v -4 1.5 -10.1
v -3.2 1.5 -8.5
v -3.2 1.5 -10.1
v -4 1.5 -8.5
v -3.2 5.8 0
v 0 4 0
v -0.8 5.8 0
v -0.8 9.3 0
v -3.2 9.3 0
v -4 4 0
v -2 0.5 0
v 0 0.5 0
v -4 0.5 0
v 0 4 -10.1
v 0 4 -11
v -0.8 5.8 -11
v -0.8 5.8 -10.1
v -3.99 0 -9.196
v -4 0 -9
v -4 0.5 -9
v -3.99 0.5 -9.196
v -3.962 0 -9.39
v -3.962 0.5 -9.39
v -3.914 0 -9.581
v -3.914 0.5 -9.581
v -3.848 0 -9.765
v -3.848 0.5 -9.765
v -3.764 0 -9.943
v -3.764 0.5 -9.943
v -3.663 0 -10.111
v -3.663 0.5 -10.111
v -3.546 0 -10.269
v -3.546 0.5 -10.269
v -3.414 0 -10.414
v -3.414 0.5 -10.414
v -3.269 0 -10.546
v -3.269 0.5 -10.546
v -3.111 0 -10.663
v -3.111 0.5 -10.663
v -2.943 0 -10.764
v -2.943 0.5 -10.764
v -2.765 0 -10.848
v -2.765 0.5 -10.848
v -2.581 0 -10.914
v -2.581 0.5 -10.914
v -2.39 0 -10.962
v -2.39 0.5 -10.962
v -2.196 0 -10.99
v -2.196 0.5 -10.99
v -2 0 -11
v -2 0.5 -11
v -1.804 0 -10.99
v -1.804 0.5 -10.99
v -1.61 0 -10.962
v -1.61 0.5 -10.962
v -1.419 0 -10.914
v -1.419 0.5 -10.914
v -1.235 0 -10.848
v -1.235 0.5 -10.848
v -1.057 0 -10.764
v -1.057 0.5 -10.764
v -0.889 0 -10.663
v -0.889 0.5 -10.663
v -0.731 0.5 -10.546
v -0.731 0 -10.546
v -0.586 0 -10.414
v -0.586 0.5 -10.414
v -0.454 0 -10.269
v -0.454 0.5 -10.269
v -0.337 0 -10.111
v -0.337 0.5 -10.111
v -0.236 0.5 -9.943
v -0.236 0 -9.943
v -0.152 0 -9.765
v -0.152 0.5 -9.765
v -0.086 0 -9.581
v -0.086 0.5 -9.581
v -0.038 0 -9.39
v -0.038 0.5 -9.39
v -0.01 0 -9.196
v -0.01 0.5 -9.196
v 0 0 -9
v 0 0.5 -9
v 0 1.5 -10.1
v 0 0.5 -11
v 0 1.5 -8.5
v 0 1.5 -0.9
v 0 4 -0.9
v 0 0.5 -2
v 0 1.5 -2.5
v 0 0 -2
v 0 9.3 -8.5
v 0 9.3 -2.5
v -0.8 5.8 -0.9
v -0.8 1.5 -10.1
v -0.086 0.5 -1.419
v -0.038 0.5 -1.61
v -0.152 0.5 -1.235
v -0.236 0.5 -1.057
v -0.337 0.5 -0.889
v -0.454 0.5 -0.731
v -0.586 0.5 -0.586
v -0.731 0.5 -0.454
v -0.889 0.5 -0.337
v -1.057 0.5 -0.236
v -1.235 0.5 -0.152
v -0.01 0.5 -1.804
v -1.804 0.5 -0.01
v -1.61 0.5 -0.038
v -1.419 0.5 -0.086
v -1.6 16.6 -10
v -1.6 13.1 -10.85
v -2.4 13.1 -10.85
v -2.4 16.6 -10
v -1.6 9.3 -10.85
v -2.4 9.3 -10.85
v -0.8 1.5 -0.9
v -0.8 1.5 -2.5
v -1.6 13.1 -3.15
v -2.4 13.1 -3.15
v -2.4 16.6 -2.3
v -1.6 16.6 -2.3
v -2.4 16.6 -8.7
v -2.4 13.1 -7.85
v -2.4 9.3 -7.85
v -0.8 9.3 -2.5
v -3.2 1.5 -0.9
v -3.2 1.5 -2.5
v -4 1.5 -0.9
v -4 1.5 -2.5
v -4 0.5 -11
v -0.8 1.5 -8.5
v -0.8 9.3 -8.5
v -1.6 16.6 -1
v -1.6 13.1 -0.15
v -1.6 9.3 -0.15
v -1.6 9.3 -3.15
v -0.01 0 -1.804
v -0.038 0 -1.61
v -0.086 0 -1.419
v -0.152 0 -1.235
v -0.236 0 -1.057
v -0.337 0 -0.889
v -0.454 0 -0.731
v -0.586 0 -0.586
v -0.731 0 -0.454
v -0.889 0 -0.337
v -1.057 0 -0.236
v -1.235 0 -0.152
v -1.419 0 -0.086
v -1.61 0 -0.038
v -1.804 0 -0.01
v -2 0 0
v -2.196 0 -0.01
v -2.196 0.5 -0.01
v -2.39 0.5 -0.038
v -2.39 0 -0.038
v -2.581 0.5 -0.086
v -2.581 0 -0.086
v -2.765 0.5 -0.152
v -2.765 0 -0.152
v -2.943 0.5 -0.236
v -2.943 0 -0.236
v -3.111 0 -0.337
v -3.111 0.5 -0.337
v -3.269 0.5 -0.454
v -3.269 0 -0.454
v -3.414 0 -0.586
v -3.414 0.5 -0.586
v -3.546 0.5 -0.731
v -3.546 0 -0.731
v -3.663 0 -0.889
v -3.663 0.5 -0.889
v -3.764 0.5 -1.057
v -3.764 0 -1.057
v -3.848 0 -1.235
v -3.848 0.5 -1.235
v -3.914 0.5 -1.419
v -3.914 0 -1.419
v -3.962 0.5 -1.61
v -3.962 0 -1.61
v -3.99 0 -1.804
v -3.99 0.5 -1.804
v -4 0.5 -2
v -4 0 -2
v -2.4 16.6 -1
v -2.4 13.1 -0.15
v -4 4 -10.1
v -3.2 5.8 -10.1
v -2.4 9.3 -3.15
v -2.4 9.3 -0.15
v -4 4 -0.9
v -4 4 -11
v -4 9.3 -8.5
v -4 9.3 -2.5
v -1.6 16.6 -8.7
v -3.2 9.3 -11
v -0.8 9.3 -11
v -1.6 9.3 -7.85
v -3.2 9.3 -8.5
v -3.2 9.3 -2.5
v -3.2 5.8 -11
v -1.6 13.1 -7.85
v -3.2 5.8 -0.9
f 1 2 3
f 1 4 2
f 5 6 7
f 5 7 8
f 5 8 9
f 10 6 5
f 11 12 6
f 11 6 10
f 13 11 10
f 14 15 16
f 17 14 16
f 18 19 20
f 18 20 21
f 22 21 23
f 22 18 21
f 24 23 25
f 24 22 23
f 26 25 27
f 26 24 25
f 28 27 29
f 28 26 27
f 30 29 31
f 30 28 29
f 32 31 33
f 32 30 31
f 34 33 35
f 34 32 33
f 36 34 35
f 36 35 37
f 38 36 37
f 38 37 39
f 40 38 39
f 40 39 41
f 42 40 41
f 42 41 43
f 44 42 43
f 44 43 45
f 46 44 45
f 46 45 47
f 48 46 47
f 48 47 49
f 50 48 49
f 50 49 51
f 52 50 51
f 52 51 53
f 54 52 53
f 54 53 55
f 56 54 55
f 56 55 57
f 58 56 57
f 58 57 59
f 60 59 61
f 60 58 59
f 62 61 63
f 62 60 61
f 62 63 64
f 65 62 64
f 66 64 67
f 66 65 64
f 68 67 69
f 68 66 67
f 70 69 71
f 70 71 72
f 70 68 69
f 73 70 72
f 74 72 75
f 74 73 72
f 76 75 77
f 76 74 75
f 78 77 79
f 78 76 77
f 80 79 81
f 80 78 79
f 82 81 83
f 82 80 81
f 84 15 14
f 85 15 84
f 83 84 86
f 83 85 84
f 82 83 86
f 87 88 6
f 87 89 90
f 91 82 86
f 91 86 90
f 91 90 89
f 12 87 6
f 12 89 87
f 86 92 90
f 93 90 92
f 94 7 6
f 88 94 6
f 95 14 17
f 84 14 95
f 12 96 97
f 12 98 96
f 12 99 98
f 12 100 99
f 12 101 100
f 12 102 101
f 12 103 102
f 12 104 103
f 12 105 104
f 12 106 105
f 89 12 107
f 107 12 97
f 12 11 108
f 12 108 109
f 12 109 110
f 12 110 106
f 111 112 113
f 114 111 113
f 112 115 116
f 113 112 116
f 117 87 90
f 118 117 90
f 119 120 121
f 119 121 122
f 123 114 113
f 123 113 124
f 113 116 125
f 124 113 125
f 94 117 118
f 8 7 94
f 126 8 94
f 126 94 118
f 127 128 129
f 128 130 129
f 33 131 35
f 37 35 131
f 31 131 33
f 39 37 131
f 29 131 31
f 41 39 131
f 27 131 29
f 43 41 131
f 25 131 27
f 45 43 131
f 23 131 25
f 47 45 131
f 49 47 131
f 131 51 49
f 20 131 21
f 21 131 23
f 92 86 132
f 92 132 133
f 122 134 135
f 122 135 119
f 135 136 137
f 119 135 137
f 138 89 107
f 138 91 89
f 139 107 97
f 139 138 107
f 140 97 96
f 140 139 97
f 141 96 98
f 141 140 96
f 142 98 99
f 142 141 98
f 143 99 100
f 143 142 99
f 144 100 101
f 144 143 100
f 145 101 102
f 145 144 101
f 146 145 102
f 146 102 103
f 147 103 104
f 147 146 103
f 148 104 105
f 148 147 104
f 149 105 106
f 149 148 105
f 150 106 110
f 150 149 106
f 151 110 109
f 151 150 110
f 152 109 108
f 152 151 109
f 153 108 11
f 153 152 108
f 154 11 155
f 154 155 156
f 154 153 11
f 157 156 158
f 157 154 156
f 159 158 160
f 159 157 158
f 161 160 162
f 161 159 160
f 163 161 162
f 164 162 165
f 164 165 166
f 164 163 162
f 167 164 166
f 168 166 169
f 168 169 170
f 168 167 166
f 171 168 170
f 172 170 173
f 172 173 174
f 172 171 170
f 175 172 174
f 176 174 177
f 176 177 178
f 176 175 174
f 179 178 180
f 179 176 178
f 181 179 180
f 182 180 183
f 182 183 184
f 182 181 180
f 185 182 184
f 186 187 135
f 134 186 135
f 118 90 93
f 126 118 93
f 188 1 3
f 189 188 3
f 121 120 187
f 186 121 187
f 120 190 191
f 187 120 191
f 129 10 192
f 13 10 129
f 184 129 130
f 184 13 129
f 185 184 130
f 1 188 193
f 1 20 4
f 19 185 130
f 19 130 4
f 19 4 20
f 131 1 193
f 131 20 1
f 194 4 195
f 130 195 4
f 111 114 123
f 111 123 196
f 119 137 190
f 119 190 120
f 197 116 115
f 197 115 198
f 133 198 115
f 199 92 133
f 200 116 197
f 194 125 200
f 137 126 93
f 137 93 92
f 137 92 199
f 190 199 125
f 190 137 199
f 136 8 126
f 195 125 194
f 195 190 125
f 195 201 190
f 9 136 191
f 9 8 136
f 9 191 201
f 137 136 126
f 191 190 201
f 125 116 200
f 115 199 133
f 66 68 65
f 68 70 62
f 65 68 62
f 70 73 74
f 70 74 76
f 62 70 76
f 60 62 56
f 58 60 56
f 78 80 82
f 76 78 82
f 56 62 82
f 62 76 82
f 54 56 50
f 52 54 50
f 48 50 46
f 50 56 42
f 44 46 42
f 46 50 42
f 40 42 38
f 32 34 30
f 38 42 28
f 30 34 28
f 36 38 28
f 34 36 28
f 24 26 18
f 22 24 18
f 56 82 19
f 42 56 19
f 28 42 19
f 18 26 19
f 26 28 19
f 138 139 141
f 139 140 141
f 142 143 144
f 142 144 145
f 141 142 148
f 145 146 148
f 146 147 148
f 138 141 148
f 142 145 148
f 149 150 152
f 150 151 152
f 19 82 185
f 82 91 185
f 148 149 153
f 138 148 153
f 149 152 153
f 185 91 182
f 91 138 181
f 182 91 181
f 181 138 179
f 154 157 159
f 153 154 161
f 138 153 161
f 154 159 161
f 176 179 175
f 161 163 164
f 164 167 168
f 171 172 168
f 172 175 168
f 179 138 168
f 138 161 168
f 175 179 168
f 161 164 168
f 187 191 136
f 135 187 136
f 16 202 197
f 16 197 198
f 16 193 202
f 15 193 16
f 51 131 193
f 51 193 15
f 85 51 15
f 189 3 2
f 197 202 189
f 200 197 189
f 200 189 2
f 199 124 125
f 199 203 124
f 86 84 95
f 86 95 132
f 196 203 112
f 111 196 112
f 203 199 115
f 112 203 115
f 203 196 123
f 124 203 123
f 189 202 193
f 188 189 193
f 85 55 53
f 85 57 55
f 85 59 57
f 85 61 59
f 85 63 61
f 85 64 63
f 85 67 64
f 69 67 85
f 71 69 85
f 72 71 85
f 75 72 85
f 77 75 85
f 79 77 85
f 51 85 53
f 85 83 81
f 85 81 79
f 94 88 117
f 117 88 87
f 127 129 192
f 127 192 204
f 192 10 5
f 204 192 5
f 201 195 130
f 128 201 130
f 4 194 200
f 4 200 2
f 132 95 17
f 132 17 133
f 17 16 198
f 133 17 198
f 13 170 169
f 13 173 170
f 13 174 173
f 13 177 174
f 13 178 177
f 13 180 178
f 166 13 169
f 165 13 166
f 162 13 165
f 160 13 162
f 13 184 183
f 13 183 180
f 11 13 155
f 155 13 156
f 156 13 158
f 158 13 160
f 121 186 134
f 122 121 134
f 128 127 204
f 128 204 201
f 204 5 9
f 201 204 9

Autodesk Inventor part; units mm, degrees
ref_plane "YZ Plane" through (0, 0, 0) normal (1, 0, 0) x (0, 1, 0)
sketch "Sketch1" plane through (0, 0, 0) normal (0, 1, 0) x (-1, 0, 0)
  line L0 (0, 0) -> (4, 0)
  line L1 (4, 0) -> (4, -11)
  line L2 (4, -11) -> (0, -11)
  line L3 (0, -11) -> (0, 0)
  dimension "d0" = 4
  dimension "d1" = 11
extrude "Extrusion1" add sketch "Sketch1" along normal blind 9.3
sketch "Sketch2" plane through (0, 9.3, 0) normal (0, 1, 0) x (1, 0, 0)
  line L0 (-4, 0) -> (0, 0) projected
  line L1 (0, 0) -> (0, 11) projected
  line L2 (0, 11) -> (-4, 11) construction
  line L3 (-4, 11) -> (-4, 0) projected
  line L4 (0, 11) -> (-4, 11) construction
  line L5 (-2.4, 0.15) -> (-1.6, 0.15)
  line L6 (-1.6, 0.15) -> (-1.6, 10.85)
  line L7 (-1.6, 10.85) -> (-2.4, 10.85)
  line L8 (-2.4, 10.85) -> (-2.4, 0.15)
  dimension "d5" = 0.8
  dimension "d6" = 4
  dimension "d7" = 1.6
  dimension "d40" = 0.15
  dimension "d41" = 0.15
extrude "Extrusion2" add sketch "Sketch2" along normal blind 7.3
sketch "Sketch3" plane through (-1.6, 9.3, -0.15) normal (1, 0, 0) x (0, 0, -1)
  line L0 (10.7, 0) -> (0, 0) projected
  line L1 (10.7, 0) -> (10.7, 7.3) projected
  line L2 (0, 7.3) -> (10.7, 7.3) projected
  line L3 (0, 0) -> (0, 7.3) projected
  line L4 (0, 7.3) -> (10.7, 7.3) projected
  line L5 (0, 0) -> (10.7, 0) projected
  line L6 (3, 7.3) -> (7.7, 7.3)
  line L7 (7.7, 7.3) -> (7.7, 0)
  line L8 (7.7, 0) -> (3, 0)
  line L9 (3, 0) -> (3, 7.3)
  point P0 (-0.15, -9.3)
  dimension "d10" = 3
  dimension "d11" = 3
extrude "Extrusion3" cut sketch "Sketch3" against normal blind 9.3 contours L0 L9 L2 L7
chamfer "Chamfer1" distance 0.85 distance2 3.5 1 edges at (-2, 16.6, -3.15) measured on face at (-2.1333, 16.6, -2.15)
chamfer "Chamfer2" distance 0.85 distance2 3.5 1 edges at (-2, 16.6, -0.15) measured on face at (-2.1333, 16.6, -1.5833)
chamfer "Chamfer3" distance 0.85 distance2 3.5 1 edges at (-2, 16.6, -7.85) measured on face at (-2.1333, 16.6, -9.85)
chamfer "Chamfer4" distance 0.85 distance2 3.5 1 edges at (-2, 16.6, -10.85) measured on face at (-2.1333, 16.6, -10.1333)
sketch "Sketch4" plane through (0, 0, 0) normal (0, -1, 0) x (1, 0, 0)
  line L0 (0, 0) -> (-4, 0) projected
  line L1 (-4, 0) -> (-4, -11) projected
  line L2 (-4, -11) -> (0, -11) projected
  line L3 (0, -11) -> (0, 0) projected
  line L4 (-2, -2) -> (-2, -9) construction
  line L5 (-4, -2) -> (-4, -9)
  line L6 (0, -9) -> (0, -2)
  arc A0 (0, -2) -> (-4, -2) centre (-2, -2) ccw
  arc A1 (-4, -9) -> (0, -9) centre (-2, -9) ccw
  line L7 (0, 0) -> (-4, 0) projected
  line L8 (0, -11) -> (0, 0) projected
  point P0 (-2, -5.5)
extrude "Extrusion4" cut sketch "Sketch4" against normal blind 0.5 contours L3 A0 L0 | A0 L1 L0 | L3 L2 A1 | A1 L2 L1
sketch "Sketch5" plane through (-4, 9.3, -11) normal (-1, 0, 0) x (0, 0, 1)
  line L0 (0, -8.8) -> (2, -8.8) projected
  line L1 (2, -8.8) -> (2, -9.3) projected
  line L2 (9, -9.3) -> (2, -9.3) construction
  line L3 (9, -8.8) -> (9, -9.3) projected
  line L4 (9, -8.8) -> (11, -8.8) projected
  line L5 (11, -8.8) -> (11, 0) projected
  line L6 (0, 0) -> (11, 0) projected
  line L7 (0, -8.8) -> (0, 0) projected
  line L8 (10.1, 0) -> (8.5, 0)
  line L9 (8.5, 0) -> (8.5, -7.8)
  line L10 (8.5, -7.8) -> (10.1, -7.8)
  line L11 (10.1, -7.8) -> (10.1, 0)
  line L12 (11, 0) -> (0, 0) projected
  line L13 (0.9, 0) -> (2.5, 0)
  line L14 (2.5, 0) -> (2.5, -7.8)
  line L15 (2.5, -7.8) -> (0.9, -7.8)
  line L16 (0.9, -7.8) -> (0.9, 0)
  point P0 (11, -9.3)
  dimension "d28" = 0.9
  dimension "d29" = 0.9
  dimension "d30" = 1.6
  dimension "d31" = 1.6
  dimension "d32" = 1.5
extrude "Extrusion5" cut sketch "Sketch5" against normal blind 0.8
ref_plane "Work Plane1" through (-2, 0, -9) normal (-1, 0, 0) x (0, 0, 1)
mirror "Mirror1" about plane through (-2, 0, -9) normal (-1, 0, 0) of "Extrusion5"
sketch "Sketch6" plane through (-1.6, 9.3, 0) normal (0, 0, 1) x (1, 0, 0)
  line L0 (0.8, 0) -> (0.8, -7.8) projected
  line L1 (0.8, -7.8) -> (0.8, 0) projected
  line L2 (-1.6, -7.8) -> (-1.6, 0) projected
  line L3 (0.8, 0) -> (0.8, -7.8) projected
  line L4 (0.8, -3.5) -> (1.6, -5.3)
  line L5 (1.6, 0) -> (1.6, -7.8) projected
  line L6 (-2.4, -9.3) -> (1.6, -9.3) projected
  line L7 (0.8, 0) -> (1.6, 0) projected
  line L8 (0.8, 0) -> (1.6, 0)
  dimension "d36" = 3.5
  dimension "d37" = 4
extrude "Extrusion6" cut sketch "Sketch6" against normal blind 1.2
mirror "Mirror2" about plane through (-2, 0, -9) normal (-1, 0, 0) of "Extrusion6"
ref_plane "Work Plane2" through (-2.4, 12.4824, -5.5) normal (0, 0, 1) x (1, 0, 0)
mirror "Mirror3" about plane through (-2.4, 12.4824, -5.5) normal (0, 0, 1) of "Extrusion6", "Mirror2"
equation "\"d7\" = -0.5 * d5 + 0.5 * d6"
equation "\"d31\" = d30"
properties part number "Mini car fuse"
